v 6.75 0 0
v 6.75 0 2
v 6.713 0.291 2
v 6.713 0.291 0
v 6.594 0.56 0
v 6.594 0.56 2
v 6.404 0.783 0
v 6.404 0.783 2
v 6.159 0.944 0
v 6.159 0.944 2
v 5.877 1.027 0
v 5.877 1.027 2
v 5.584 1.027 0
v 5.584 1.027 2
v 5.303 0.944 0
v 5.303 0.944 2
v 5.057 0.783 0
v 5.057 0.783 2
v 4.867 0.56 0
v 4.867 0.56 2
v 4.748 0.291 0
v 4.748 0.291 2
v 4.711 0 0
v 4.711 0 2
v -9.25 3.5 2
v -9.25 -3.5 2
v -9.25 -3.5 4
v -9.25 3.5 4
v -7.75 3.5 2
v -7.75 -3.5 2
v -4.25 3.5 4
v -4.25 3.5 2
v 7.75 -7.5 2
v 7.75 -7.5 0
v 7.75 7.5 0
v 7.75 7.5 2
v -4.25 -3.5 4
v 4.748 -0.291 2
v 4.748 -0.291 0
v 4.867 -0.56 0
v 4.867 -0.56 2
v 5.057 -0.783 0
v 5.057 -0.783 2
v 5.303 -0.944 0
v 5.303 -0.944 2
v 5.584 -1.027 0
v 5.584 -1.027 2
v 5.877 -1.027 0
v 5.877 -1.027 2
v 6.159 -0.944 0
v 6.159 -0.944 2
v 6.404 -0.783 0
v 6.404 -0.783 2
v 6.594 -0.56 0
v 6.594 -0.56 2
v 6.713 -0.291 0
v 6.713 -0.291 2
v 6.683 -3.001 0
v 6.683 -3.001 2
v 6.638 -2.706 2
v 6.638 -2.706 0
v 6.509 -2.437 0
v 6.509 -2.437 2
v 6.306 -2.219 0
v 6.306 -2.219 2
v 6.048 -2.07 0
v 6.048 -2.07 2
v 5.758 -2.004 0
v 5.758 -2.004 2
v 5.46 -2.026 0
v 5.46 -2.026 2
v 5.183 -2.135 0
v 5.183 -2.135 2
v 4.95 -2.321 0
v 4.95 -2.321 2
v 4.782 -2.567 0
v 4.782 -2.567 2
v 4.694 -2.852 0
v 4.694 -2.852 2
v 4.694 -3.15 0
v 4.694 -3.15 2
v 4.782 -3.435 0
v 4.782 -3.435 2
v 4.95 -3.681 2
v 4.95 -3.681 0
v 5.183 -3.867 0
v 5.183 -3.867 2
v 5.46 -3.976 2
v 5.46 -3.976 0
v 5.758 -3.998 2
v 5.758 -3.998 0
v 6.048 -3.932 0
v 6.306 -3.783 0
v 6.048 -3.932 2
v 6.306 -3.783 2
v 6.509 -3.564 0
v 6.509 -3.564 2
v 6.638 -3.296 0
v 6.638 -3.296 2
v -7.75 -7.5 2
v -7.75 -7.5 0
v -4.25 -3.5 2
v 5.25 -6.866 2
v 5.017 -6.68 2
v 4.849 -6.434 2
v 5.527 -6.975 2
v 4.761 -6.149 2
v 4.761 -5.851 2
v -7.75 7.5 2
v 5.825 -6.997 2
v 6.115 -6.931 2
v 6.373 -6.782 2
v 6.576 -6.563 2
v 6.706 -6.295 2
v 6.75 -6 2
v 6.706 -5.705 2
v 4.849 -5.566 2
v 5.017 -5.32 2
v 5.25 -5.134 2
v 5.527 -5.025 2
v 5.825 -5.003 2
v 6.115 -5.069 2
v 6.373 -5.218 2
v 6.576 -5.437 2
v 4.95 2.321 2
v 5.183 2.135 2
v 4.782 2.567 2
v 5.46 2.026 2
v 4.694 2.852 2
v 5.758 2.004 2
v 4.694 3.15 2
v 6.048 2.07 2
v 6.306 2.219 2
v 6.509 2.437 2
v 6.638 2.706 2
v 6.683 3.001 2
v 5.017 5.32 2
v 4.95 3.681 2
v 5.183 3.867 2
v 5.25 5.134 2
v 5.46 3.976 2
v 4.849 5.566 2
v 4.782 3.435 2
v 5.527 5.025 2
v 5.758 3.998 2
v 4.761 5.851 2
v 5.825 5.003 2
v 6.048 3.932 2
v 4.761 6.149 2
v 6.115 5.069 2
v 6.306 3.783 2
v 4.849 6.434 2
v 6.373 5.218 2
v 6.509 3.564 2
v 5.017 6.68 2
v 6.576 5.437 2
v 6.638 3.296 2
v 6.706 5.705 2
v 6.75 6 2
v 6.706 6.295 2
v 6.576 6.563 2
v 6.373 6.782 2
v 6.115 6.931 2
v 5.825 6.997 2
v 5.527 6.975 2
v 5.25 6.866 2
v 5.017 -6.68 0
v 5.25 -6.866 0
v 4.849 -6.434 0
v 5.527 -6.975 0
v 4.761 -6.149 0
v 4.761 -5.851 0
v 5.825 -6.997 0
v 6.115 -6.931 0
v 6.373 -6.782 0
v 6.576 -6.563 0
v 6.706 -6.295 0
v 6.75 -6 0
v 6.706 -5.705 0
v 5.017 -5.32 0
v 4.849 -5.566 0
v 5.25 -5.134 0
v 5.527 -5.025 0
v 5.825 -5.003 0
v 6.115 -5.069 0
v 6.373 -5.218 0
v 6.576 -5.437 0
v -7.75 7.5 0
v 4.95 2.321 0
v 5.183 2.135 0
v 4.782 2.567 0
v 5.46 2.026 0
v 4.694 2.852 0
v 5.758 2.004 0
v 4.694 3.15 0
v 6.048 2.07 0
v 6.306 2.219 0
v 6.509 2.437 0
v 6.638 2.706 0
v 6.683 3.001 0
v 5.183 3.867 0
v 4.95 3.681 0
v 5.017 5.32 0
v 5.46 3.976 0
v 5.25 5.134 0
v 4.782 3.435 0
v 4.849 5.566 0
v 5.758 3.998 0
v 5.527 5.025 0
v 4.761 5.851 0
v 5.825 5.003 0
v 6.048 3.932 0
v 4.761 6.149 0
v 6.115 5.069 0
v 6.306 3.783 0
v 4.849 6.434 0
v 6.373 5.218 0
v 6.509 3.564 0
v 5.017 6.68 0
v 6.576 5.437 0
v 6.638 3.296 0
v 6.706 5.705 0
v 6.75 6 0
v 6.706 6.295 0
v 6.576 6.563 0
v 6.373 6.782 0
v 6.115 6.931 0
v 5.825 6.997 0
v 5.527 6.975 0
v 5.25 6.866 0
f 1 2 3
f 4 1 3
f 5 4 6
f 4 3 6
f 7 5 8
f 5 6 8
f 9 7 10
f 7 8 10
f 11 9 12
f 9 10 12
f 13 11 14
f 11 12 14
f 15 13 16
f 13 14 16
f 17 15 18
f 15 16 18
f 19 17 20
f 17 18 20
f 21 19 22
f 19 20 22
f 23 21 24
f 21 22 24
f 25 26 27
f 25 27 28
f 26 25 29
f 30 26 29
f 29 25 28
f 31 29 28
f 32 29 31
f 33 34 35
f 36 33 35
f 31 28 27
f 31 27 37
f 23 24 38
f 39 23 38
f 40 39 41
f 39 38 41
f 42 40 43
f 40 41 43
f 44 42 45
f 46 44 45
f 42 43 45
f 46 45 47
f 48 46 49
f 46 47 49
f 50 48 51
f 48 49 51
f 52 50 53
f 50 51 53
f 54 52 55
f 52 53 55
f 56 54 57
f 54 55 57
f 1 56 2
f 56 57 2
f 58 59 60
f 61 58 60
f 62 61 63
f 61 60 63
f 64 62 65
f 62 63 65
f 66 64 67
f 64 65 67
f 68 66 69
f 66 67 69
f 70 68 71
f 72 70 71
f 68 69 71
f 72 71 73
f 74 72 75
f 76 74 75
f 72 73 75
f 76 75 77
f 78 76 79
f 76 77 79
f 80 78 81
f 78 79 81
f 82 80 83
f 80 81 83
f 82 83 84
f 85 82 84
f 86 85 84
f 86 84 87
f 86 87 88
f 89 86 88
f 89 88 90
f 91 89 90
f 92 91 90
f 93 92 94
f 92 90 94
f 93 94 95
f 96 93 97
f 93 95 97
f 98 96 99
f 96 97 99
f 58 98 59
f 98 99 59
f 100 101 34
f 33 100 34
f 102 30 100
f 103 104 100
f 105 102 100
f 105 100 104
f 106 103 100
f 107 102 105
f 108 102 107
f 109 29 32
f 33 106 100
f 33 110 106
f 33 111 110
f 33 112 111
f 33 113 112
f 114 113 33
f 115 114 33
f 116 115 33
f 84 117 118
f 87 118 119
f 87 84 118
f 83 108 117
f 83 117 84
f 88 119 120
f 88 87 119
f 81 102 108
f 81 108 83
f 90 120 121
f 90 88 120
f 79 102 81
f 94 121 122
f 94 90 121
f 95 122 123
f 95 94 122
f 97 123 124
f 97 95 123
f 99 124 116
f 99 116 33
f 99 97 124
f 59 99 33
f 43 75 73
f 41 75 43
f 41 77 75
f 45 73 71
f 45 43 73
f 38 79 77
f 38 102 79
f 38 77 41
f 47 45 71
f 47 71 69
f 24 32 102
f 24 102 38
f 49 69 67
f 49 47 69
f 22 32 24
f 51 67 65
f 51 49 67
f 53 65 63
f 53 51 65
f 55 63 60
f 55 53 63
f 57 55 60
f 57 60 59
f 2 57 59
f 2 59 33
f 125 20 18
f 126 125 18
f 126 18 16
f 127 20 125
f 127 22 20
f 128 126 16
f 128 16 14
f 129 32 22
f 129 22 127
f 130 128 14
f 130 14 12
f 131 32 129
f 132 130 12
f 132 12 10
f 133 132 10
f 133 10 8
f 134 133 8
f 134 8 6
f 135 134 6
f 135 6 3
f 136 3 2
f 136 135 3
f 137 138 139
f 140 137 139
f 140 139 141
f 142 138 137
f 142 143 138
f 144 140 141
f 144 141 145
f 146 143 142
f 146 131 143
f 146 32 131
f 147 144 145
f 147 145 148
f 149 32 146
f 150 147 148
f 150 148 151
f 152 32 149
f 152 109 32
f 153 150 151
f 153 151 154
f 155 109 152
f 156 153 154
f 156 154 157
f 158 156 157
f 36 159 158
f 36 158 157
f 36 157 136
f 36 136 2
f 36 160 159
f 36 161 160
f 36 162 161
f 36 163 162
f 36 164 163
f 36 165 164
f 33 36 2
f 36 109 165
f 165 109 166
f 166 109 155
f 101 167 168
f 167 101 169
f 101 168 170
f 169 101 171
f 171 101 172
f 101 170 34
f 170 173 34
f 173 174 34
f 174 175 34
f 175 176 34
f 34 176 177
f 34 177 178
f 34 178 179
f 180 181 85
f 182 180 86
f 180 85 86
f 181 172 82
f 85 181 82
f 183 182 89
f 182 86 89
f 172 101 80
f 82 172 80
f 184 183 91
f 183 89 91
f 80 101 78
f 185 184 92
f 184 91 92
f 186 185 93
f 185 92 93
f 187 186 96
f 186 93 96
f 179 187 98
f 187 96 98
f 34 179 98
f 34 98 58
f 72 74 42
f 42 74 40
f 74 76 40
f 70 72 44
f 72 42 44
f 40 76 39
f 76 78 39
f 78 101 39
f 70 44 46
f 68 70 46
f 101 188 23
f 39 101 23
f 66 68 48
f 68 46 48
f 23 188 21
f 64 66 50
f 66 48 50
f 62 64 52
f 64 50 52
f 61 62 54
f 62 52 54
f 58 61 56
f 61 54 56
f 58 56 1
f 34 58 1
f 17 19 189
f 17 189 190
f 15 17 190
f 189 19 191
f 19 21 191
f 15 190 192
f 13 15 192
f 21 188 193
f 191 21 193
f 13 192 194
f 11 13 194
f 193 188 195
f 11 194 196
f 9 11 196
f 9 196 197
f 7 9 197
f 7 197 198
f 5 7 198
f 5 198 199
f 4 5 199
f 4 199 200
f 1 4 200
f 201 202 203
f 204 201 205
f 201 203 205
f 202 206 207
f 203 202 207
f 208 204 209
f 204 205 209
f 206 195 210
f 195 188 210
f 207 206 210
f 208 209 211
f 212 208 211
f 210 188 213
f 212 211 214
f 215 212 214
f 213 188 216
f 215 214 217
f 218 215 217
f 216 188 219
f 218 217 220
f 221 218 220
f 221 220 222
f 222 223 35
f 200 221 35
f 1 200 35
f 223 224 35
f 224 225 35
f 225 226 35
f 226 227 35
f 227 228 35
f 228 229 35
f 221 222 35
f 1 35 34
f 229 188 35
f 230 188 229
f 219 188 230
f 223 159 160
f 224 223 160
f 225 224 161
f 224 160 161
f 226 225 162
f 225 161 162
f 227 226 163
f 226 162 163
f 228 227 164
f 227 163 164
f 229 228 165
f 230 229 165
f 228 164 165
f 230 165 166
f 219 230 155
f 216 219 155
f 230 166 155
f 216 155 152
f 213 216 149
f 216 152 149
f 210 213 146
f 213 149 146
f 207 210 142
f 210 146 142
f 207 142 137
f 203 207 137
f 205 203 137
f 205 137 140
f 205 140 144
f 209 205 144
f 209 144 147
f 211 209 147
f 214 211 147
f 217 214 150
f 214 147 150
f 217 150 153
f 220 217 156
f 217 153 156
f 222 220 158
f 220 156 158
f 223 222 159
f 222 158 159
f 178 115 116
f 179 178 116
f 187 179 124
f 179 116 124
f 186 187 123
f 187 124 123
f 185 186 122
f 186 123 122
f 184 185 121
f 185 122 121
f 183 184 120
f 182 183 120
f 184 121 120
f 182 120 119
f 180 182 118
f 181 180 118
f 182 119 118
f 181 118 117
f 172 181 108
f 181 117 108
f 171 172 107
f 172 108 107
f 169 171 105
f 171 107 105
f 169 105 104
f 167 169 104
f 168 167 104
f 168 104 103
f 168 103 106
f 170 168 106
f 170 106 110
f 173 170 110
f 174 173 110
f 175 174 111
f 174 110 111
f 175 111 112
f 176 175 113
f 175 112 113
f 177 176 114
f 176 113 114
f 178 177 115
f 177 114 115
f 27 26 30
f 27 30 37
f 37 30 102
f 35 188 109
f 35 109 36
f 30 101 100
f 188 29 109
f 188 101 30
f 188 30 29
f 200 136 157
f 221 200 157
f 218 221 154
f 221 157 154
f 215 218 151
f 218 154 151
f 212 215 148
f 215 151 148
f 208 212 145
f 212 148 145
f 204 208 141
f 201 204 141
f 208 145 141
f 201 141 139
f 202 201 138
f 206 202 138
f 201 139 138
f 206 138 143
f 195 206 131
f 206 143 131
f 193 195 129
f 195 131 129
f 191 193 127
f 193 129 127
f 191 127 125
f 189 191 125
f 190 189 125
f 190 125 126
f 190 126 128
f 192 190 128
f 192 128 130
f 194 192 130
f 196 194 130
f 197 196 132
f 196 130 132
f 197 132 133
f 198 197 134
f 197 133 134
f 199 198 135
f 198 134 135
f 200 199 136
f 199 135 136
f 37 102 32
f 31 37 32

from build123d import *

# Parameters (mm, degrees)
F0_W     = 15.5
F0_H     = 15
F1_DEPTH = 2
F3_R     = 1
F3_R_2   = 1.0194429363
F4_DEPTH = 2
F5_W     = 5
F5_H     = 7
F6_DEPTH = 2


# Not quite as in the source:
# - a feature names something its author has since deleted; it is built from what else it names


with BuildPart() as f1:
    # F0 (on Top) → F1 (new body)
    with BuildSketch(Plane.XY):
        Rectangle(F0_W, F0_H)
    extrude(amount=F1_DEPTH)

    # F3 (on offset) → F4 (cut)
    with BuildSketch(Plane.XY.offset(2)):
        with Locations((5.75, 6)):
            Circle(F3_R)
        with Locations((5.6829168866, 3.0007501178)):
            Circle(F3_R)
        with Locations((5.7305570637, -0.0183169664)):
            Circle(F3_R_2)
        with Locations((5.7305570637, 0.0183169664)):
            Circle(F3_R_2)
        with Locations((5.6829168866, -3.0007501178)):
            Circle(F3_R)
        with Locations((5.75, -6)):
            Circle(F3_R)
    extrude(amount=-F4_DEPTH, mode=Mode.SUBTRACT)

    # F5 (on offset) → F6 (join)
    with BuildSketch(Plane.XY.offset(2)):
        with Locations((-6.75, 0)):
            Rectangle(F5_W, F5_H)
    extrude(amount=F6_DEPTH)


solid = f1.part
